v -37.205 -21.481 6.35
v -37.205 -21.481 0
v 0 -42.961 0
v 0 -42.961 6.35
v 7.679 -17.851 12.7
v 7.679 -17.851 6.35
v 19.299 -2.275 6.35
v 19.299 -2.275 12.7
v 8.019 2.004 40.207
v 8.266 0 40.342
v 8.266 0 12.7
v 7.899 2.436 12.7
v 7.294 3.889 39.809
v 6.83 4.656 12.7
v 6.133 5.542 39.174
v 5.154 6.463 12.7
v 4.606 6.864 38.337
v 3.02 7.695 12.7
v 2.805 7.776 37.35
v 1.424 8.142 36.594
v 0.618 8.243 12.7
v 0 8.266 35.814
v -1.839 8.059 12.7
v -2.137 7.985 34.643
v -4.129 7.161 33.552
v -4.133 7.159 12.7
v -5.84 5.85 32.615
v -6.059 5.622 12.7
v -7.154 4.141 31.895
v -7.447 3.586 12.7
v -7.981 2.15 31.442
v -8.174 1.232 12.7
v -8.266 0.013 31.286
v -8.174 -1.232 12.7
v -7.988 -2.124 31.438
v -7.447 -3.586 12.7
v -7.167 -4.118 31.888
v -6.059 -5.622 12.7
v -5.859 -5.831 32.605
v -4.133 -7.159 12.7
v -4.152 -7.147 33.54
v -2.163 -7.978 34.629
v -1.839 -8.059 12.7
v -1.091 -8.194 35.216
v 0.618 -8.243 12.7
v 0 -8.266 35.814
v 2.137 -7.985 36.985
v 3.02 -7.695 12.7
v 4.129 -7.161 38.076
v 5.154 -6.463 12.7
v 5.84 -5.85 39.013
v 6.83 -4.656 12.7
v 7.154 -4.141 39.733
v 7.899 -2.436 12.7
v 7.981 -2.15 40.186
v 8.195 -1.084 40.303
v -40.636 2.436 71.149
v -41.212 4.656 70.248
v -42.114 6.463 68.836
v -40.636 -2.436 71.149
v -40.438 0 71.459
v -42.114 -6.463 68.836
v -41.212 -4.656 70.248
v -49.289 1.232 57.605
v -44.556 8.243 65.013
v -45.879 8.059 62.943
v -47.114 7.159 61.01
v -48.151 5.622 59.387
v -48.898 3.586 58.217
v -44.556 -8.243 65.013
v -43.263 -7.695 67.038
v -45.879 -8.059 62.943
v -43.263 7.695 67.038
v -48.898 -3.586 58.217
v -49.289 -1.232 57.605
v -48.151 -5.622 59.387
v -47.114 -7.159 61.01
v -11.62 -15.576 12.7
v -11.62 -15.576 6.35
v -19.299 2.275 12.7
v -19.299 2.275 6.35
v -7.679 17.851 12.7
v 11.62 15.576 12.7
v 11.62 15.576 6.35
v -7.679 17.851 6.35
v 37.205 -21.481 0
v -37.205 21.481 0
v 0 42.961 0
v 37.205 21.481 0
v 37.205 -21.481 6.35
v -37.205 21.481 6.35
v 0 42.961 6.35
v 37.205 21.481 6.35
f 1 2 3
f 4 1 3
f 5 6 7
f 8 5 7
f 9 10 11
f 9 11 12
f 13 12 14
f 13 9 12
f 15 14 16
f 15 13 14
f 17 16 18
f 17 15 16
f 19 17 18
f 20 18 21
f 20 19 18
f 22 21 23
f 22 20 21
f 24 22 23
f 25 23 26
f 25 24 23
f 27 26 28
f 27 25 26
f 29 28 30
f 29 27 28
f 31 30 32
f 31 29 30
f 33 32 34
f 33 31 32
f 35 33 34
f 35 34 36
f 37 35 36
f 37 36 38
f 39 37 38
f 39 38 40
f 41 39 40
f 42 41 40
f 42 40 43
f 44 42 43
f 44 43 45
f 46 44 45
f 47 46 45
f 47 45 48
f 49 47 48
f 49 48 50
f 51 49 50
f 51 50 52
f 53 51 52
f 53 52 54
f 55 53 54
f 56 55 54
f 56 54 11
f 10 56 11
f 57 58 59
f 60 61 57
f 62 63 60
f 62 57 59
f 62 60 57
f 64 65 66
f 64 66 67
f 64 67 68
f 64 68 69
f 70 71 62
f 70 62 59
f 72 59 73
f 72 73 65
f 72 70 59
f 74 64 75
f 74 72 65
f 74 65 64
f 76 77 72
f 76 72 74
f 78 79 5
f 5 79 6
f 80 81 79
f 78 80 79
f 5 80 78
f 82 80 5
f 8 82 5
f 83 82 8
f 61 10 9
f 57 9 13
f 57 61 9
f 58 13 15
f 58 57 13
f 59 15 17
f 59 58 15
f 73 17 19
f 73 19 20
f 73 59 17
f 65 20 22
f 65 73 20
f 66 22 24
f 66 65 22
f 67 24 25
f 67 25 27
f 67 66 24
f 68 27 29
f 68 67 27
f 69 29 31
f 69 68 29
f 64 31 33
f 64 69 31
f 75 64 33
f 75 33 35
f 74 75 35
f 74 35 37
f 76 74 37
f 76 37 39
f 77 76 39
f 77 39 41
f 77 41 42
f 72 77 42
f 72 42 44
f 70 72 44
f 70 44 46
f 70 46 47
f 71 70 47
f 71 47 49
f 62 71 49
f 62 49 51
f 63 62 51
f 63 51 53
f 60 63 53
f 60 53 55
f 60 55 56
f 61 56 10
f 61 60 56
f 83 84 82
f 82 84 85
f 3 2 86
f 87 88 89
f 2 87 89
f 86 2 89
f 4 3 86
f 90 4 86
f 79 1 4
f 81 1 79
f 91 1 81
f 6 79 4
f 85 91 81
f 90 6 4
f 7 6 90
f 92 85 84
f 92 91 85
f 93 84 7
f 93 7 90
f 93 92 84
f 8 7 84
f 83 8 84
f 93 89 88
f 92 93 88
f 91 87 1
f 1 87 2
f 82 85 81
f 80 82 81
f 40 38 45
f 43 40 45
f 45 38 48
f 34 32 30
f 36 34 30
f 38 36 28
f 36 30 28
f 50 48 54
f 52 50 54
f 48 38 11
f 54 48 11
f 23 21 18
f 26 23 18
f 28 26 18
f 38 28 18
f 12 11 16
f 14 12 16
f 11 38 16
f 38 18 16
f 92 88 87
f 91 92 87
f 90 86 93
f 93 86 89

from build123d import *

# Parameters (mm, degrees)
F1_DEPTH = 6.35
F3_DEPTH = 6.35
F5_R     = 8.265991875


with BuildPart() as f1:
    # F0 (on Top) → F1 (new body)
    with BuildSketch(Plane.XY):
        Polygon((37.2053198516, -21.4805014316), (37.2053198516, 21.4805014316), (0, 42.9610028633), (-37.2053198516, 21.4805014316), (-37.2053198516, -21.4805014316), (0, -42.9610028633), align=None)
    extrude(amount=F1_DEPTH)

    # F2 (on face) → F3 (join)
    with BuildSketch(Plane.XY.offset(6.35)):
        Polygon((19.298683545, -2.2752430233), (11.6197600305, 15.5755286979), (-7.6789235145, 17.8507717212), (-19.298683545, 2.2752430233), (-11.6197600305, -15.5755286979), (7.6789235145, -17.8507717212), align=None)
    extrude(amount=F3_DEPTH)


with BuildPart() as f6:
    # F6: sweep along a path in F4
    with BuildLine(Plane.XZ) as f6_path:
        Line((0, 12.7), (0, 35.8140021563))
        Line((0, 35.8140021563), (-44.8887273669, 64.4929111004))
    # F5 (on face) → F6 (sweep)
    with BuildSketch(Plane.XY.offset(12.7)):
        Circle(F5_R)
    sweep(path=f6_path.line, transition=Transition.RIGHT)


solid = Compound([f1.part, f6.part])
